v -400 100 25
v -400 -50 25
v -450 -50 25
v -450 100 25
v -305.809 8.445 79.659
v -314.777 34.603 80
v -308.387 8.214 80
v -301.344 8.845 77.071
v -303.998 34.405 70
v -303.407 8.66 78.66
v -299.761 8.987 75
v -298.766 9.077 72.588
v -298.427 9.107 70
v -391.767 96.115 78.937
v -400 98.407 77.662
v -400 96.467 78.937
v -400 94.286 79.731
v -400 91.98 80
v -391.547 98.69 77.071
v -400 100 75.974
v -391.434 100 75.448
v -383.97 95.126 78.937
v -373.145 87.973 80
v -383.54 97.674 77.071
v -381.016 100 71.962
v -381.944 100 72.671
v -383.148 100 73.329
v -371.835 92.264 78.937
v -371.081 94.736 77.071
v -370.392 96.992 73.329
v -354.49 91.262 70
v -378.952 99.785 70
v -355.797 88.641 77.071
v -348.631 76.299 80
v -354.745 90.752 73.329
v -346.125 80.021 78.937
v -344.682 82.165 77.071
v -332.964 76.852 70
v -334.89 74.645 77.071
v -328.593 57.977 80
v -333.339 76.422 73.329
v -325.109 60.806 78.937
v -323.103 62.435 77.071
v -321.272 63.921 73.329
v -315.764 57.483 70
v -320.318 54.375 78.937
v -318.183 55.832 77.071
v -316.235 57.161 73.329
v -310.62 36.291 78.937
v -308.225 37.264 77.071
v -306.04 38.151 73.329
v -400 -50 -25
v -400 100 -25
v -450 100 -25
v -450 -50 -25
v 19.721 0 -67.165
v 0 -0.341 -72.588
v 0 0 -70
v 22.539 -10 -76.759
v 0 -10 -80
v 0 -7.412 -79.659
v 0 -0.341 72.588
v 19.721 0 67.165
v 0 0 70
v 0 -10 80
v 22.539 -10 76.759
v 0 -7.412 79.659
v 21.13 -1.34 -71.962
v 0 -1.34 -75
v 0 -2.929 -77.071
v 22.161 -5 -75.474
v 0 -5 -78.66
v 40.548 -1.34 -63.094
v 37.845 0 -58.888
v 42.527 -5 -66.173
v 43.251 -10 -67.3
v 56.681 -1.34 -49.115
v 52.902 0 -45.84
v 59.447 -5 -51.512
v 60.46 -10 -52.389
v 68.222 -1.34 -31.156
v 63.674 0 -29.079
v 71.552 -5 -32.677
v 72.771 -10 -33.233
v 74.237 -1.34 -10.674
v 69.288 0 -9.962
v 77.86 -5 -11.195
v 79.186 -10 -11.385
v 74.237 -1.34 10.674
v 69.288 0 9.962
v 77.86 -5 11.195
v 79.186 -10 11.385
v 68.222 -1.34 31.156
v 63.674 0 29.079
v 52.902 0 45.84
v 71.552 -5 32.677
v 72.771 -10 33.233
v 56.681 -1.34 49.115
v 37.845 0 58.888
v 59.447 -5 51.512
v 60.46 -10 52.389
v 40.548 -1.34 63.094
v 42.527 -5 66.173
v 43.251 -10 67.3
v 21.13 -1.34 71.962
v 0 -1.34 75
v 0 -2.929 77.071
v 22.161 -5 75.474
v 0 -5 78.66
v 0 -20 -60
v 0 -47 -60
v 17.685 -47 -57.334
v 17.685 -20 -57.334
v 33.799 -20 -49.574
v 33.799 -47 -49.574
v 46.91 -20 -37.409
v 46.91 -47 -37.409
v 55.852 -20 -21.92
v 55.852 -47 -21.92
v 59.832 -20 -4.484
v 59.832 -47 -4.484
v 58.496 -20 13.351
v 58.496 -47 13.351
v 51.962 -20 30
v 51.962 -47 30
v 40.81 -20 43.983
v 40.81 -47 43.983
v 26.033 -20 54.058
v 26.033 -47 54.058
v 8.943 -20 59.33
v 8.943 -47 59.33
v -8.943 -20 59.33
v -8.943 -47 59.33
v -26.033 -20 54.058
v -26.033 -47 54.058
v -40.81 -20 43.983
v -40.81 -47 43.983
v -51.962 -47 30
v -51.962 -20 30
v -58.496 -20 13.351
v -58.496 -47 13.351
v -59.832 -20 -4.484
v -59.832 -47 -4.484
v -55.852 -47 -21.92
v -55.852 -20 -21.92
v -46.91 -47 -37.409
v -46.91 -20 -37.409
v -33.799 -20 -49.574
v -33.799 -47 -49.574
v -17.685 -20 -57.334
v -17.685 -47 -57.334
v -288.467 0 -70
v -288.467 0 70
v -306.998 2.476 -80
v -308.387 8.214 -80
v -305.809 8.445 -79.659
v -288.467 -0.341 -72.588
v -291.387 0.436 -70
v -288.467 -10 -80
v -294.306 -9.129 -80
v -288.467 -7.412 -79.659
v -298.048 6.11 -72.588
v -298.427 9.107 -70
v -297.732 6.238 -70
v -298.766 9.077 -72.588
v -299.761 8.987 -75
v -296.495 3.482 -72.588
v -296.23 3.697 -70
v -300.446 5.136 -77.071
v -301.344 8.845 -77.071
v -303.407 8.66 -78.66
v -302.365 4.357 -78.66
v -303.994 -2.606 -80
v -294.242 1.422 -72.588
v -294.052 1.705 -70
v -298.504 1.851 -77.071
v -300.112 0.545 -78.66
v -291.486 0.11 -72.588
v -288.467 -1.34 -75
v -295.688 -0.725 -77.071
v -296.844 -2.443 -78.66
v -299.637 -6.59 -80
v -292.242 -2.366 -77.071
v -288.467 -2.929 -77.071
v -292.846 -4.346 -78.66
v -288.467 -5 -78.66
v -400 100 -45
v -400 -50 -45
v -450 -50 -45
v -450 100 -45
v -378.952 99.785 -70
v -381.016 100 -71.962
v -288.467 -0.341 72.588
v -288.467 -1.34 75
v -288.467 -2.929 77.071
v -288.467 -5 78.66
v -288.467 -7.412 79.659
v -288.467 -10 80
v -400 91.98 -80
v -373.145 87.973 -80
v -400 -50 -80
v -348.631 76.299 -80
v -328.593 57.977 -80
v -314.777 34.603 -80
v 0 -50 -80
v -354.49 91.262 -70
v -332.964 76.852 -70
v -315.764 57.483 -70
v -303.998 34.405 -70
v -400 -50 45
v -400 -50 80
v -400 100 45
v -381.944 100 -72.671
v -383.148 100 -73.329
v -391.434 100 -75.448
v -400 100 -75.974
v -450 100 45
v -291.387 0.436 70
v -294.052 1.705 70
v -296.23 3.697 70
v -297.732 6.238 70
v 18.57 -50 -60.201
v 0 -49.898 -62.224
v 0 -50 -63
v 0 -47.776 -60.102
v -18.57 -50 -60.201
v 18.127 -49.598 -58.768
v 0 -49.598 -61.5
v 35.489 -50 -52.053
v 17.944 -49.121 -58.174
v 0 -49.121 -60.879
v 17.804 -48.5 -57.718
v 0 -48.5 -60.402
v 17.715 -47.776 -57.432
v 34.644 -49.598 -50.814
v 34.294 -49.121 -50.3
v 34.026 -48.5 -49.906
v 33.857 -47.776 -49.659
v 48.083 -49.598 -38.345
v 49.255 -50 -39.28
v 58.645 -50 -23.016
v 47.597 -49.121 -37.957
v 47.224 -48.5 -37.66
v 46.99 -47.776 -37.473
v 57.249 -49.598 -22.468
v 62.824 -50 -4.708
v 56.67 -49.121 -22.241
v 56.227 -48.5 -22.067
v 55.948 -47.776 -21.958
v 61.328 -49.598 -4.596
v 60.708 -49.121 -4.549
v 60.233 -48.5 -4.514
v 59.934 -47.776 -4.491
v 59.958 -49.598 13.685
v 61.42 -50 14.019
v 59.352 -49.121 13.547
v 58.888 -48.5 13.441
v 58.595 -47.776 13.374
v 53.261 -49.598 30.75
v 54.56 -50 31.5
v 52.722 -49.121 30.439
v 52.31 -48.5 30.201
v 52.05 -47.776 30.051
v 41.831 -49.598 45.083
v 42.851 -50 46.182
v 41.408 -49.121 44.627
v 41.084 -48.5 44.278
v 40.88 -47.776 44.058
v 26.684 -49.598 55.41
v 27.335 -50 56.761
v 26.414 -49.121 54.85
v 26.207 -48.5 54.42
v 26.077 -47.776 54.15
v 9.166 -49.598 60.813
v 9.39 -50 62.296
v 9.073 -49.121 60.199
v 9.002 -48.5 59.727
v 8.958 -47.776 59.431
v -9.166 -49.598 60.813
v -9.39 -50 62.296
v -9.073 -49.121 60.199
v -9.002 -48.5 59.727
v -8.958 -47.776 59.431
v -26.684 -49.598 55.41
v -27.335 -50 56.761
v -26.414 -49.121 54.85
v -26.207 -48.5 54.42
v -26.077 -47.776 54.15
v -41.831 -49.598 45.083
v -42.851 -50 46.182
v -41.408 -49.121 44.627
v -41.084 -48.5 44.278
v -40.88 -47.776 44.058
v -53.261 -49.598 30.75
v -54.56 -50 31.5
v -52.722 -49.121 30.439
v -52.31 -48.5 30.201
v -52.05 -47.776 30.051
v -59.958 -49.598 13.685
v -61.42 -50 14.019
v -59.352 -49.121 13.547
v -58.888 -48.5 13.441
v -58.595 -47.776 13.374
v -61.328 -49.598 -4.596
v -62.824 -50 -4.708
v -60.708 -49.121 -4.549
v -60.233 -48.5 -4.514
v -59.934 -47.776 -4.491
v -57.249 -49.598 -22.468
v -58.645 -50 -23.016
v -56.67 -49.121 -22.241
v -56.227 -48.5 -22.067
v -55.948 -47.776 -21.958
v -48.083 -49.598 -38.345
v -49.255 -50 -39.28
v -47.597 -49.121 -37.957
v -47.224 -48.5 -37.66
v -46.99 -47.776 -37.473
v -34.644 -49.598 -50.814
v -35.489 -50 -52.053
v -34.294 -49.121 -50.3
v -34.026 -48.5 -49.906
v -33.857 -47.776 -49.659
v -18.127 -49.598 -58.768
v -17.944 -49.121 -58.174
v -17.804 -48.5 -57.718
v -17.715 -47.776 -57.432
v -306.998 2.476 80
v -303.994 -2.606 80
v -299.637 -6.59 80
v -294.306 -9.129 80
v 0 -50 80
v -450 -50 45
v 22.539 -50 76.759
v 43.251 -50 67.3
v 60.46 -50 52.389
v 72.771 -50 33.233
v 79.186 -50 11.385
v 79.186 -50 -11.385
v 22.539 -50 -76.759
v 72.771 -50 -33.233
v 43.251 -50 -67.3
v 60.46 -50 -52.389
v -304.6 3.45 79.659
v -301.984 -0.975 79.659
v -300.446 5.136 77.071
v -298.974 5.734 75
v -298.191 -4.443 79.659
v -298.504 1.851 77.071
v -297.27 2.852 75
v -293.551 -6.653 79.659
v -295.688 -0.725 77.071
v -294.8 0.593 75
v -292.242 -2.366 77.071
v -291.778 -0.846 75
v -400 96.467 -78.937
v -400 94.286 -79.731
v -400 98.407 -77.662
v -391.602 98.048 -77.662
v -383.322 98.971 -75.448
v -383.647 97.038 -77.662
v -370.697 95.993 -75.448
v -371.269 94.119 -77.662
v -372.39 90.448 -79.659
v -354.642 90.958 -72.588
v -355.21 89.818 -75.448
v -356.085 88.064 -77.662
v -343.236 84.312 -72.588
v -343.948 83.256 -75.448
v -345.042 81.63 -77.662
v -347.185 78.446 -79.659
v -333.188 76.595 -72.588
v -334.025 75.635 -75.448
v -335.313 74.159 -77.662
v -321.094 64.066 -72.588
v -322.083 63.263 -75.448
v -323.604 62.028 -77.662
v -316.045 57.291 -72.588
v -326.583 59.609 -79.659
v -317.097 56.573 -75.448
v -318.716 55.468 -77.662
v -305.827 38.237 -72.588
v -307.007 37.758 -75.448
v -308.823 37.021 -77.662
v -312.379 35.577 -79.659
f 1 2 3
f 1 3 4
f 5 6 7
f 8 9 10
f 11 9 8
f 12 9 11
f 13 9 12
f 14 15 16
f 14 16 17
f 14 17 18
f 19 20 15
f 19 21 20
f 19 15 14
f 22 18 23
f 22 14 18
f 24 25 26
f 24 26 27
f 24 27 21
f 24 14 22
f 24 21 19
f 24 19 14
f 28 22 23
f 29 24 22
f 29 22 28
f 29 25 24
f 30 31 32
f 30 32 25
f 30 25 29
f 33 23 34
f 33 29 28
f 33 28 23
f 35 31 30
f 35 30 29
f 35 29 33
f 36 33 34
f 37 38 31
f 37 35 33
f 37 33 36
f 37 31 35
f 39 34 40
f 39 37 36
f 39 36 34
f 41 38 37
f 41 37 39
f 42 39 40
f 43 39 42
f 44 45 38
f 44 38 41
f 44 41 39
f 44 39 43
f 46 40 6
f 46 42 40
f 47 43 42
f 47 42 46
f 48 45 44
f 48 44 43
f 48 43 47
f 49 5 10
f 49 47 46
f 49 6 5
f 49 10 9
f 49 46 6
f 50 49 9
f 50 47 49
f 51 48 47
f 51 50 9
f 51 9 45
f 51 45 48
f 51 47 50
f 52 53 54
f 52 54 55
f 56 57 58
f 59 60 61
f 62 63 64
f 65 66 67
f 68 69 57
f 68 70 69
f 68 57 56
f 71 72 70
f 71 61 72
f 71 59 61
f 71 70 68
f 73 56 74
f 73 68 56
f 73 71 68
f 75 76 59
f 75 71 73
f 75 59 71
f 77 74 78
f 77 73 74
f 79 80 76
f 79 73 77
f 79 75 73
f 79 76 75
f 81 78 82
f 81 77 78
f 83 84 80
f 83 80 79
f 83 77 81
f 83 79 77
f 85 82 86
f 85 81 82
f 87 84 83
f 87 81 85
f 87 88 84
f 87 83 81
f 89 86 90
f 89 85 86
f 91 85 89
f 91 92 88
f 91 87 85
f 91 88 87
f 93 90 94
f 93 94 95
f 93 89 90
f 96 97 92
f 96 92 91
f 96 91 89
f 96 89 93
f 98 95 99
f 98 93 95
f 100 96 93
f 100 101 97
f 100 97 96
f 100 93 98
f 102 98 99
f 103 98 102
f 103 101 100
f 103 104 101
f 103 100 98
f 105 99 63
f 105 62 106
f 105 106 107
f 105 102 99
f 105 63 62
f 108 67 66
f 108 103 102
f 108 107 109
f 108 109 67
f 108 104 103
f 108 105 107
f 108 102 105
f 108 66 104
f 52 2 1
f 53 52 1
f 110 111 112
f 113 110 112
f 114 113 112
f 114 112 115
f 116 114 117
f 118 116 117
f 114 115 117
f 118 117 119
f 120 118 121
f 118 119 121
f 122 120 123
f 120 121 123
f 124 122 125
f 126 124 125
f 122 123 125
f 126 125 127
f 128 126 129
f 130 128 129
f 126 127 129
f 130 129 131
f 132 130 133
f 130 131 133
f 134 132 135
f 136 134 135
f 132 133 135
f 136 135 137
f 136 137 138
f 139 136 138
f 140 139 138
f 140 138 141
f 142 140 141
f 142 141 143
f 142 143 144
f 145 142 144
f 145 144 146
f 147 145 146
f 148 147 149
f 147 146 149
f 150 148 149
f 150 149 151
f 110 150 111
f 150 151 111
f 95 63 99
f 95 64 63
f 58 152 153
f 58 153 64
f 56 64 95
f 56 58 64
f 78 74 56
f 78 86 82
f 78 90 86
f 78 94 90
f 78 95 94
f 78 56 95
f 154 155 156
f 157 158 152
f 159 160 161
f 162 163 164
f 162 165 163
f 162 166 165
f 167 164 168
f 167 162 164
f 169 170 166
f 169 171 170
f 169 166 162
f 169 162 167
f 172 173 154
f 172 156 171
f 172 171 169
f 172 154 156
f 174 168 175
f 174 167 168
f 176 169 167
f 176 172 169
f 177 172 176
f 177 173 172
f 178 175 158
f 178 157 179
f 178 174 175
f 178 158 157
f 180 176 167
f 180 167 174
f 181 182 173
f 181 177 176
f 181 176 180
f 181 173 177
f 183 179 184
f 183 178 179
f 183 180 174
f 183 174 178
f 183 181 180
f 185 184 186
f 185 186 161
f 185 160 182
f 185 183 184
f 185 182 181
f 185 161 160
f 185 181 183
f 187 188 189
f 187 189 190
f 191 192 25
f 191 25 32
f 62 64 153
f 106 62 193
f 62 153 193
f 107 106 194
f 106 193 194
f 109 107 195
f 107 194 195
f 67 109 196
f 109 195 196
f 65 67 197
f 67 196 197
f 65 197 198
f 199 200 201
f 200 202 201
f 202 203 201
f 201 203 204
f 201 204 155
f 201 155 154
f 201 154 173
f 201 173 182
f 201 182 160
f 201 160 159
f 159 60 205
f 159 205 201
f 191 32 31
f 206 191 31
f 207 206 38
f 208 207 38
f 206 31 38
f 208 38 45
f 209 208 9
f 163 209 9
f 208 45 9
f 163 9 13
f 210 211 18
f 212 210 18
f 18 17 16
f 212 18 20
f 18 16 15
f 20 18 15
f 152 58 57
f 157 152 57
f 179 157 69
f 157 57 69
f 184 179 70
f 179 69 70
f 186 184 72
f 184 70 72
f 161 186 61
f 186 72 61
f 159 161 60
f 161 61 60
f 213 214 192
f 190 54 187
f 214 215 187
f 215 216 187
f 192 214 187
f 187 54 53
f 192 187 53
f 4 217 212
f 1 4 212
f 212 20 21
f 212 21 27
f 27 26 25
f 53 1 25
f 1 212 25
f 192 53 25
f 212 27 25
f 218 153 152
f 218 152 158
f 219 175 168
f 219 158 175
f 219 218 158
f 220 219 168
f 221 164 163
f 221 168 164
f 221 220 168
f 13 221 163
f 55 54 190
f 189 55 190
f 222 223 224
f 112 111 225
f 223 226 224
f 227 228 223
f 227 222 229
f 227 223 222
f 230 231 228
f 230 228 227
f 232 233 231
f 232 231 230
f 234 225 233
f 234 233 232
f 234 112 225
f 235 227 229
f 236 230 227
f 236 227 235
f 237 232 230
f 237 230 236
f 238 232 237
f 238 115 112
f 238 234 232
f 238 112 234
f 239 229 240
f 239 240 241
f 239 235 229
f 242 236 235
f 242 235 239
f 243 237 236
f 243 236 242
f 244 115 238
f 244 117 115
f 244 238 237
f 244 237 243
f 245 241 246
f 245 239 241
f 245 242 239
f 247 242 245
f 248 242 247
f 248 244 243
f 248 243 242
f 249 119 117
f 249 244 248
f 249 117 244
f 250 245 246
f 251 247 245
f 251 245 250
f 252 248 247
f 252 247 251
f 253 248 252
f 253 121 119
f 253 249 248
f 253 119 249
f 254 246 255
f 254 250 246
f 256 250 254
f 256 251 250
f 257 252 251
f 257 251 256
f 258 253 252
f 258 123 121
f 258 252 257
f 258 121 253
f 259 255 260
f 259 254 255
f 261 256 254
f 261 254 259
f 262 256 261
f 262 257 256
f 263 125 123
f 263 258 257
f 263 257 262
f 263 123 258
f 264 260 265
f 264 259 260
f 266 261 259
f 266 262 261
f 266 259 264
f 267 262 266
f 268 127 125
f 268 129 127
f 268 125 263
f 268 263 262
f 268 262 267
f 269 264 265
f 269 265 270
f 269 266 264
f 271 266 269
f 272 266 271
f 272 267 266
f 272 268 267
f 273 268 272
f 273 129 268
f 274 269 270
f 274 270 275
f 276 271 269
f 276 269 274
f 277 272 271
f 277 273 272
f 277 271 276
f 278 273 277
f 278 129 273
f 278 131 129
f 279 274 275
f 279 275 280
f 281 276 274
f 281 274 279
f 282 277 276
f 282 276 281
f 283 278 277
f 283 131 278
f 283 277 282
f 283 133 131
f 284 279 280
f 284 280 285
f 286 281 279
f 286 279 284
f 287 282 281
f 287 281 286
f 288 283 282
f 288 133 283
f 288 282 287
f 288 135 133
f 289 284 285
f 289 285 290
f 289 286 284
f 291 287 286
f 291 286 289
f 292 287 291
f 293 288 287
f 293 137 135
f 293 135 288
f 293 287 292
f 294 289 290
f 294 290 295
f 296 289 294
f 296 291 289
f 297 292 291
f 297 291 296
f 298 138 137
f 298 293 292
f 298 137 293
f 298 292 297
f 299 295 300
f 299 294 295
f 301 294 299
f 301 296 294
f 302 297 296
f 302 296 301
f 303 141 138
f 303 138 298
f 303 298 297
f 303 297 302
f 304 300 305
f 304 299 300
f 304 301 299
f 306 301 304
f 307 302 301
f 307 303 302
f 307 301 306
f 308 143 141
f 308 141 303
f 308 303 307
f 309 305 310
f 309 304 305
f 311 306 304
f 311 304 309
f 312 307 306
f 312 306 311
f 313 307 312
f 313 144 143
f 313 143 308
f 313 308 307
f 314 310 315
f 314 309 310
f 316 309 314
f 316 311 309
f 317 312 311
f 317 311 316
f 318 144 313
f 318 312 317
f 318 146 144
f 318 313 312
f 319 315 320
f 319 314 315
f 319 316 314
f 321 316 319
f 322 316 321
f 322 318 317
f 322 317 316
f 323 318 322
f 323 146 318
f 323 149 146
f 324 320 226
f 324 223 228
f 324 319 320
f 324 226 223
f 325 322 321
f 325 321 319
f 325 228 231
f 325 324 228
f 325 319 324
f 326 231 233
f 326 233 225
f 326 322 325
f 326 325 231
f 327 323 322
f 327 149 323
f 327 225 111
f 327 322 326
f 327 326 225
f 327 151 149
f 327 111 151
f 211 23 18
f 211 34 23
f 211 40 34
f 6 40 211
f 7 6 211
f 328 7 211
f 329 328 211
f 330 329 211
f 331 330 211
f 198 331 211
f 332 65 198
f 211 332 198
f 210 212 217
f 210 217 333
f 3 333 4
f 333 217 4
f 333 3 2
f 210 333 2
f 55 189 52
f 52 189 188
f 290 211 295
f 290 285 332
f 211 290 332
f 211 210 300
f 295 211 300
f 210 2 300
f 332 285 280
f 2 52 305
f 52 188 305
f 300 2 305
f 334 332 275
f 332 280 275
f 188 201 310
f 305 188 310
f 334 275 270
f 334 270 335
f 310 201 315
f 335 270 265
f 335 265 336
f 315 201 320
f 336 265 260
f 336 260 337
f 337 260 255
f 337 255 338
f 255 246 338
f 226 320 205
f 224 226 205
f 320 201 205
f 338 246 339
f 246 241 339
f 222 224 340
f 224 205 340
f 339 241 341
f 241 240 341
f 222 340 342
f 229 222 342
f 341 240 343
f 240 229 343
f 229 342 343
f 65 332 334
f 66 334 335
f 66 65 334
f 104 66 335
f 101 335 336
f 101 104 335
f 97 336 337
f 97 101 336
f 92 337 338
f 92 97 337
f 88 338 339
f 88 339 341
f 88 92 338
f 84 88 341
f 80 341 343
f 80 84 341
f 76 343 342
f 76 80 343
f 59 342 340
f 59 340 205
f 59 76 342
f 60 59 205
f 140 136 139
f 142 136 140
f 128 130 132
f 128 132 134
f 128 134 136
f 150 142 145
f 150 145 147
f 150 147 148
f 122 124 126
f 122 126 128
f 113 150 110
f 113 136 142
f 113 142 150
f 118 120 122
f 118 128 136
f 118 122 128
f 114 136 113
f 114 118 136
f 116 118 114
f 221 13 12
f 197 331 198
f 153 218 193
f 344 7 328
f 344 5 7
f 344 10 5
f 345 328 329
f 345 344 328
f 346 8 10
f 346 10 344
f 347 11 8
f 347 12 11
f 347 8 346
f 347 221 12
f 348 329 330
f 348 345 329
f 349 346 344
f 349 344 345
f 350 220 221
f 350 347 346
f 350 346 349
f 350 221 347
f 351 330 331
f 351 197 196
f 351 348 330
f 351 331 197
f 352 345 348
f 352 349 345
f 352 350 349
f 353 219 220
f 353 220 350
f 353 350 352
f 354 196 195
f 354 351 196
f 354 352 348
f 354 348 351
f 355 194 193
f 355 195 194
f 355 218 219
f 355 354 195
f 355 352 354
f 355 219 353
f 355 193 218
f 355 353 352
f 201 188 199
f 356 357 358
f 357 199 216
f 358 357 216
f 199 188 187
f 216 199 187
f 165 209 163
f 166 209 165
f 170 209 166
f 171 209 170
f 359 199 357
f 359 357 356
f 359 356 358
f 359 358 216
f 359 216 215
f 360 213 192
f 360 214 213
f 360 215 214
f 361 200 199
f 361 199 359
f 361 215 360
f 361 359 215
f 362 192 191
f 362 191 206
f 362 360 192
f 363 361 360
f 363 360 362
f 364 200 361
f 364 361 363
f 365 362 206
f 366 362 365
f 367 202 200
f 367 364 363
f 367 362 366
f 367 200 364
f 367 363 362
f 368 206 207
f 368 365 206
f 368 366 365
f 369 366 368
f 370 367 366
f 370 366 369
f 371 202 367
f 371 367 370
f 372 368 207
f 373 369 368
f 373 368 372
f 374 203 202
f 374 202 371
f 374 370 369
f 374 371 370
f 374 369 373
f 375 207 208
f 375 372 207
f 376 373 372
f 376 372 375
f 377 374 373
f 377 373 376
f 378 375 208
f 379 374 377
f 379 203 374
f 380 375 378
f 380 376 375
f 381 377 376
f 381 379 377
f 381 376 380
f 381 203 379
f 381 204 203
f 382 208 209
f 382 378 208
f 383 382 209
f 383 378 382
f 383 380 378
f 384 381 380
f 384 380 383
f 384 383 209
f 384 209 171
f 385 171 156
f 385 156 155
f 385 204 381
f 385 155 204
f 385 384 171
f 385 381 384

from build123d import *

# Parameters (mm, degrees)
CROQUIS1_R              = 80
SALIENTE_EXTRUIR1_DEPTH = 50
SALIENTE_EXTRUIR2_DEPTH = 160
REDONDEO1_R             = 10
SALIENTE_EXTRUIR3_DEPTH = 50
CROQUIS4_R              = 60
CORTAR_EXTRUIR1_DEPTH   = 30
REDONDEO2_R             = 3


with BuildPart() as part:
    # Croquis1 → Saliente-Extruir1 (new body)
    with BuildSketch(Plane(origin=(0, 0, 0), x_dir=(1, 0, 0), z_dir=(0, 1, 0))):
        Circle(CROQUIS1_R)
        with BuildLine():
            Line((-400, -80), (0, -80))
            ThreePointArc((-1.47e-14, -80), (-80, 9.8e-15), (4.9e-15, 80))
            Line((0, 80), (-400, 80))
            Line((-400, 80), (-400, -80))
        make_face()
    extrude(amount=-SALIENTE_EXTRUIR1_DEPTH)

    # Croquis2 → Saliente-Extruir2 (add)
    with BuildSketch(Plane.XY.offset(80)):
        with BuildLine():
            Line((-400, 0), (-400, 100))
            Line((-400, 100), (-380, 100))
            ThreePointArc((-380, 100), (-321.1342666126881, 64.65443602167947), (-298.01960972814436, 0))
            Line((-298.01960972814436, 0), (-400, 0))
        make_face()
    extrude(amount=-SALIENTE_EXTRUIR2_DEPTH)

    # Redondeo1
    # the kernel refuses this fillet: 10 mm, written as the material it adds along each edge
    with BuildSketch(Plane(origin=(-298.01960972814436, -1.78e-15, 80), x_dir=(-0.04469534055522645, 0.9990006639300358, 0), z_dir=(0, 0, -1))) as redondeo1_piece_1:
        with BuildLine():
            CenterArc((9.563049951863276, 9.990006639300384), REDONDEO1_R, 182.561707770238, 84.87658445952434)
            Line((-0.4269566874370806, 9.543053233748063), (0, 0))
            ThreePointArc((0, 0), (4.5580482731555065, 0.10191268242766027), (9.11609654631102, -3e-17))
        make_face()
    extrude(amount=160)
    # the kernel refuses this fillet: 10 mm, written as the material it takes off along each edge
    with BuildSketch(Plane(origin=(0, 0, 0), x_dir=(8e-17, 0, -1), z_dir=(-1, 0, -8e-17))) as redondeo1_2_piece_1:
        with BuildLine():
            CenterArc((80 - REDONDEO1_R, REDONDEO1_R), REDONDEO1_R, 270, 90)
            Line((80 - REDONDEO1_R, -1.78e-15), (80, 0))
            Line((80, 0), (80, REDONDEO1_R))
        make_face()
    revolve(axis=Axis((0, 0, 0), (0, -1, 0)), revolution_arc=180, mode=Mode.SUBTRACT)
    with BuildSketch(Plane(origin=(-288.467010237163, 0, 80), x_dir=(0, 0, -1), z_dir=(1, 0, 0)), Plane(origin=(0, 0, -80), x_dir=(0, 0, 1), z_dir=(-1, 0, 0))) as redondeo1_2_piece_2:
        with BuildLine():
            CenterArc((REDONDEO1_R, -REDONDEO1_R), REDONDEO1_R, 90, 90)
            Line((0, -REDONDEO1_R), (0, 0))
            Line((0, 0), (REDONDEO1_R, 0))
        make_face()
    extrude(amount=288.467010237163, mode=Mode.SUBTRACT)
    with BuildSketch(Plane(origin=(-379.9999999999998, 100, 82.6745154998789), x_dir=(0.9795385270864807, -0.20125673641706543, 0), z_dir=(0, 0, -1))) as redondeo1_2_piece_3:
        with BuildLine():
            CenterArc((1.0173546356310936, 9.999862440723893), REDONDEO1_R, 258.3895408215282, 11.91098588292175)
            Line((-0.9952127285396165, 0.20447716985909684), (0, 0))
            ThreePointArc((0, 0), (0.5349030999756575, -0.00140283486632694), (1.0698061999513302, -1e-17))
        make_face()
    extrude(amount=165.34903099975782, mode=Mode.SUBTRACT)
    with BuildSketch(Plane(origin=(-400, 1.1013e-13, -80), x_dir=(-0.04779718259448206, 0.9988570615138231, 0), z_dir=(-0.9988570615138231, -0.04779718259448206, 0))) as redondeo1_2_piece_4:
        with BuildLine():
            CenterArc((101.98039027185561 - REDONDEO1_R, -REDONDEO1_R), REDONDEO1_R, 0, 90)
            Line((101.98039027185561, -REDONDEO1_R), (101.98039027185561, 0))
            Line((101.98039027185561, 0), (101.98039027185561 - REDONDEO1_R, 0))
        make_face()
    revolve(axis=Axis((-400, 1.1013e-13, -80), (0, 0, -1)), revolution_arc=87.61620511364934, mode=Mode.SUBTRACT)
    with BuildSketch(Plane(origin=(-400, 1.1013e-13, 80), x_dir=(-0.04779718259448206, 0.9988570615138231, 0), z_dir=(-0.9988570615138231, -0.04779718259448206, 0))) as redondeo1_2_piece_5:
        with BuildLine():
            CenterArc((101.98039027185561 - REDONDEO1_R, REDONDEO1_R), REDONDEO1_R, 270, 90)
            Line((101.98039027185561, REDONDEO1_R), (101.98039027185561, 0))
            Line((101.98039027185561, 0), (101.98039027185561 - REDONDEO1_R, 0))
        make_face()
    revolve(axis=Axis((-400, 1.1013e-13, 80), (0, 0, -1)), revolution_arc=87.61620511364934, mode=Mode.SUBTRACT)
    with BuildSketch(Plane(origin=(-288.467010237163, 10.000000000000012, 80), x_dir=(-0.9960046530653047, -0.0893013497784993, 0), z_dir=(-0.0893013497784993, 0.9960046530653047, 0))) as redondeo1_2_piece_6:
        with BuildLine():
            CenterArc((10.000000000000025 + REDONDEO1_R, -REDONDEO1_R), REDONDEO1_R, 90, 90)
            Line((10.000000000000025, -REDONDEO1_R), (10.000000000000025, 0))
            Line((10.000000000000025, 0), (10.000000000000025 + REDONDEO1_R, 0))
        make_face()
    revolve(axis=Axis((-288.467010237163, 10.000000000000012, 80), (0, 0, 1)), revolution_arc=84.87658445952435, mode=Mode.SUBTRACT)
    with BuildSketch(Plane(origin=(-288.467010237163, 10.000000000000012, -80), x_dir=(-0.9960046530653047, -0.0893013497784993, 0), z_dir=(-0.0893013497784993, 0.9960046530653047, 0))) as redondeo1_2_piece_7:
        with BuildLine():
            CenterArc((10.000000000000025 + REDONDEO1_R, REDONDEO1_R), REDONDEO1_R, 180, 90)
            Line((10.000000000000025, REDONDEO1_R), (10.000000000000025, 0))
            Line((10.000000000000025, 0), (10.000000000000025 + REDONDEO1_R, 0))
        make_face()
    revolve(axis=Axis((-288.467010237163, 10.000000000000012, -80), (0, 0, 1)), revolution_arc=84.87658445952435, mode=Mode.SUBTRACT)

    # Croquis3 → Saliente-Extruir3 (add)
    with BuildSketch(Plane.ZY.offset(400)):
        Polygon((44.99999999999997, -50), (24.999999999999982, -50), (25, 100), (45, 100), align=None)
        Polygon((-45, 100), (-25, 100), (-24.999999999999982, -50), (-44.99999999999997, -50), align=None)
    extrude(amount=SALIENTE_EXTRUIR3_DEPTH)

    # Croquis4 → Cortar-Extruir1 (cut)
    with BuildSketch(Plane.XZ.offset(50)):
        with Locations(Location((0, 0, 0), (0, 0, 270))):
            Circle(CROQUIS4_R)
    extrude(amount=-CORTAR_EXTRUIR1_DEPTH, mode=Mode.SUBTRACT)

    # Redondeo2
    redondeo2_edges = [part.edges().sort_by_distance(p)[0] for p in [
        (4.502e-14, -50, 60),
    ]]
    fillet(redondeo2_edges, radius=REDONDEO2_R)


solid = part.part
